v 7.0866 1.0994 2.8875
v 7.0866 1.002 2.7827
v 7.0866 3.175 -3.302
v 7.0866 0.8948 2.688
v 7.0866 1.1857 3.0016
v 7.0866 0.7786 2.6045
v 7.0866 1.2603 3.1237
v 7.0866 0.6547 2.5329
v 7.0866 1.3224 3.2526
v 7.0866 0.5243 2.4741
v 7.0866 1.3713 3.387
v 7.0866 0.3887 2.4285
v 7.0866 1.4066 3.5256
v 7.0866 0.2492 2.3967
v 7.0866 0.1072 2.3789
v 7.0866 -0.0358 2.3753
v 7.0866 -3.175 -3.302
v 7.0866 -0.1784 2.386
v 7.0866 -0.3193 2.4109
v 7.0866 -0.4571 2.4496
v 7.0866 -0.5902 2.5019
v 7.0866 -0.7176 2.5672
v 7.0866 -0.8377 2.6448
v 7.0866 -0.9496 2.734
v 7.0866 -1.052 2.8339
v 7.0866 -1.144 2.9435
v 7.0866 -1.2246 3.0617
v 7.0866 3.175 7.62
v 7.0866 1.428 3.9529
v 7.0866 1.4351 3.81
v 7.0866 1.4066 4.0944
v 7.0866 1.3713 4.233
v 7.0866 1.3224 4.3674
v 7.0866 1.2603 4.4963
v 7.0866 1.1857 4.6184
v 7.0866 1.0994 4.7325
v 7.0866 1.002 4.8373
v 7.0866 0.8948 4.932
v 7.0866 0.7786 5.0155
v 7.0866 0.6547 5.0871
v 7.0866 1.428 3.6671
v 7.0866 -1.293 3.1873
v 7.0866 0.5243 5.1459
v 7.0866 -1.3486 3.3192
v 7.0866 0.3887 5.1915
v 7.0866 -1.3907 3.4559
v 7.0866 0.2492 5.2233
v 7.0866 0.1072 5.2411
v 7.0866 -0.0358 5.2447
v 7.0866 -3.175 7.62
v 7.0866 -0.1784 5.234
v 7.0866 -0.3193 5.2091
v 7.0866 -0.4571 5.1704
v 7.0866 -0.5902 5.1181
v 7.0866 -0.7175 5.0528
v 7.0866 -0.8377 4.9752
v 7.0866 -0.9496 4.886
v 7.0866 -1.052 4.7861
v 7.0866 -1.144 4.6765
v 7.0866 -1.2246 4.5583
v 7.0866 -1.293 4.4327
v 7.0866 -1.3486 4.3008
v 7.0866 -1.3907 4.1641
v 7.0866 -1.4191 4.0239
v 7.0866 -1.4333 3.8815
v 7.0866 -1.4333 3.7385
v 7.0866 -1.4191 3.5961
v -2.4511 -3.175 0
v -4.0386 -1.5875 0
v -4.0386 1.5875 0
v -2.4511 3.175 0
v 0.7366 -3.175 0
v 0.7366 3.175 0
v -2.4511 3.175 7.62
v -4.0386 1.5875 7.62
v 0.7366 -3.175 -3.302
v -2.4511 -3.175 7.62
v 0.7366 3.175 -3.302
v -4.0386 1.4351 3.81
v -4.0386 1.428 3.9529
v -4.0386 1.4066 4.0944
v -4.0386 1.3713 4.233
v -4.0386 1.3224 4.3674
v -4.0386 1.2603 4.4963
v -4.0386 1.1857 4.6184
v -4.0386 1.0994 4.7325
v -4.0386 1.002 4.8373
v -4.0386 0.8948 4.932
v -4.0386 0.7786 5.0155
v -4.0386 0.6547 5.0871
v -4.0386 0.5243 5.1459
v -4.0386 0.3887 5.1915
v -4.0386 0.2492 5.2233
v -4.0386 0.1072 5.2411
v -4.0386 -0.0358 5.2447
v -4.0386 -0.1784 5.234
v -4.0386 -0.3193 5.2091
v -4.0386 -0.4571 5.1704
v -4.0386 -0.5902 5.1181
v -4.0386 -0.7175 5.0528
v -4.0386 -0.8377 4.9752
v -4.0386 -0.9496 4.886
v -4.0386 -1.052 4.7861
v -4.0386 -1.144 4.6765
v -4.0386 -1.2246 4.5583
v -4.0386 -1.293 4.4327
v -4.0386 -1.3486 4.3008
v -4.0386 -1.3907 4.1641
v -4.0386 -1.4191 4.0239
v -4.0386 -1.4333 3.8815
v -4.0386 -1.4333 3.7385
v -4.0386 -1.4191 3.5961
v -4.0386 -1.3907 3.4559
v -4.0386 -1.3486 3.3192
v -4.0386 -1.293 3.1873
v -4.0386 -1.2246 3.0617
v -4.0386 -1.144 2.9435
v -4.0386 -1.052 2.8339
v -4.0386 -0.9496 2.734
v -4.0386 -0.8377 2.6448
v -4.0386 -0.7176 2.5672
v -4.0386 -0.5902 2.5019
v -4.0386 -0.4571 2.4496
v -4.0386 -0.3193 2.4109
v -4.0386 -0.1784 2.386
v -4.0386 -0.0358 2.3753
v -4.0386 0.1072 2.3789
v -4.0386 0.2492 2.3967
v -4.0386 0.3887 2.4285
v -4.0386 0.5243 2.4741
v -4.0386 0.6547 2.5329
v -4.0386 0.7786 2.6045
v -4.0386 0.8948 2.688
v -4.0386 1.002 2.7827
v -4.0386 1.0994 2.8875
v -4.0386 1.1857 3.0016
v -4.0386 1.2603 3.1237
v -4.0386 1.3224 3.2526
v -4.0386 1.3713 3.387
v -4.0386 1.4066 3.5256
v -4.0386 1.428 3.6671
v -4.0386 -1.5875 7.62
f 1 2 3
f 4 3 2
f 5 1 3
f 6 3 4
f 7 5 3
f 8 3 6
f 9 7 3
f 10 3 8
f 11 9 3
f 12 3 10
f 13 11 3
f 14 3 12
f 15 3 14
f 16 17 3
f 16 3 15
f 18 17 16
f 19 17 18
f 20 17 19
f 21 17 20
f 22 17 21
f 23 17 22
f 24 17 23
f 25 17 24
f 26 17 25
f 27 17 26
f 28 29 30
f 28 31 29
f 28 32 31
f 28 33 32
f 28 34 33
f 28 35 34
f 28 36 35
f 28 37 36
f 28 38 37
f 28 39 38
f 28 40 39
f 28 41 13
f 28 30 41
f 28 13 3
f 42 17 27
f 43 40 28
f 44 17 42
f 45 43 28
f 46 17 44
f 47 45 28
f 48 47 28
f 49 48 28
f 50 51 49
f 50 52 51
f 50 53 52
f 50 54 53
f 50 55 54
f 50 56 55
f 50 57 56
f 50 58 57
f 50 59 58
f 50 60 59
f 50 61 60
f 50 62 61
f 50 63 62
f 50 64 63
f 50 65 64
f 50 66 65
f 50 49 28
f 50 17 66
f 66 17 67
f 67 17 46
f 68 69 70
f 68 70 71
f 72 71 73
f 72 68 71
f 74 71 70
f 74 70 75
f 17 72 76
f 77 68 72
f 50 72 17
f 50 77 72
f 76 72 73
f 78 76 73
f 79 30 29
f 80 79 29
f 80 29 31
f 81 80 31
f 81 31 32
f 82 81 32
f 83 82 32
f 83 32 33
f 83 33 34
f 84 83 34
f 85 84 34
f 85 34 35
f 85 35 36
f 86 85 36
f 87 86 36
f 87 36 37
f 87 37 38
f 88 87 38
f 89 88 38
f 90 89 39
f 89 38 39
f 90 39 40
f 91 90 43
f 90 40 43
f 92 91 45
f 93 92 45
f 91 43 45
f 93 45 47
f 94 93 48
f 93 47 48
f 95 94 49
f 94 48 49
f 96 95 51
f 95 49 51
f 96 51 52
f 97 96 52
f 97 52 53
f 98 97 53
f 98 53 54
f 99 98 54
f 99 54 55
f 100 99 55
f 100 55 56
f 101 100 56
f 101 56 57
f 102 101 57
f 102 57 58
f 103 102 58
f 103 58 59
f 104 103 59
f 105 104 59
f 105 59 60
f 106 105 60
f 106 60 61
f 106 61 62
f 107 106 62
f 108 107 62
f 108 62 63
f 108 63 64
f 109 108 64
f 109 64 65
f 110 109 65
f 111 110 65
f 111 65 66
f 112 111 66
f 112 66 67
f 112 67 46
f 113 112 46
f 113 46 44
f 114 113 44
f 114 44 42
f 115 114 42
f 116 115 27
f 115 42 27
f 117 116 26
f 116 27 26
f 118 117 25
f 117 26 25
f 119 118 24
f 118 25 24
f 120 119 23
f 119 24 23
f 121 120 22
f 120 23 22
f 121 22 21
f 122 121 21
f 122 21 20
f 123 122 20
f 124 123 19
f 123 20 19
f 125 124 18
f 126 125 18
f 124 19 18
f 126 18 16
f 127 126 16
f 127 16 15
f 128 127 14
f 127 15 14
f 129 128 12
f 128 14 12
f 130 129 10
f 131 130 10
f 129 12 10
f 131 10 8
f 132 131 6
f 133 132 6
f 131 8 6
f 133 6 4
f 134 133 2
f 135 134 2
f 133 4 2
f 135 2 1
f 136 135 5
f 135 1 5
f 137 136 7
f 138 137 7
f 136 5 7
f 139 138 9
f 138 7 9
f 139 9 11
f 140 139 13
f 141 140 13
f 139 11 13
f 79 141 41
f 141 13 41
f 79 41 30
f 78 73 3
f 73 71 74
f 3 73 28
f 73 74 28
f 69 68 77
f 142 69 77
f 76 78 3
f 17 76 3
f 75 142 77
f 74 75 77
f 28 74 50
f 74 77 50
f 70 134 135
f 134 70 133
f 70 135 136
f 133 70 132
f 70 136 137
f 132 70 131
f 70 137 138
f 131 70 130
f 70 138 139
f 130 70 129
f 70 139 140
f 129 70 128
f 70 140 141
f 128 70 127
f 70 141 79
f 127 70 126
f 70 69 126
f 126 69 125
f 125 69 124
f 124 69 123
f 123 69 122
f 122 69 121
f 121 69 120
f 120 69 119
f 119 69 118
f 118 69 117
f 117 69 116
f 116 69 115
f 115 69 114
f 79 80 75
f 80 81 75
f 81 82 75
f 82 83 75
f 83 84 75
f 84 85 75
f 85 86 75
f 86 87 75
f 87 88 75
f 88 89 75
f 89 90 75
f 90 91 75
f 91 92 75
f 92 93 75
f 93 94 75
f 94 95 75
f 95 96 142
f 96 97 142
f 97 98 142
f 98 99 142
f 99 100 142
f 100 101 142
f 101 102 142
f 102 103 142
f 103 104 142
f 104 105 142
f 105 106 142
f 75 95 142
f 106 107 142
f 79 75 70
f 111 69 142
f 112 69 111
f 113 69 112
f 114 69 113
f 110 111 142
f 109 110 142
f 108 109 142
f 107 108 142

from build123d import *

# Parameters (mm, degrees)
F0_W     = 6.35
F0_H     = 6.35
F1_DEPTH = 3.302
F2_W     = 11.1252
F2_H     = 7.62
F3_DEPTH = 3.175
F4_R     = 1.4351
F5_DEPTH = 11.1262
F6_SIZE  = 1.5875


with BuildPart() as f1:
    # F0 (on Top) → F1 (new body)
    with BuildSketch(Plane.XY):
        with Locations((3.9116, 0)):
            Rectangle(F0_W, F0_H)
    extrude(amount=-F1_DEPTH)

    # F2 (on Front) → F3 (join, symmetric)
    with BuildSketch(Plane.XZ):
        with Locations((1.524, 3.81)):
            Rectangle(F2_W, F2_H)
    extrude(amount=F3_DEPTH, both=True)

    # F4 (on face) → F5 (cut, through all)
    with BuildSketch(Plane.YZ.offset(7.0866)):
        with Locations((0, 3.81)):
            Circle(F4_R)
    extrude(amount=-F5_DEPTH, mode=Mode.SUBTRACT)

    # F6
    f6_edges = [f1.edges().sort_by_distance(p)[0] for p in [
        (-4.0386, -3.175, 3.81),
        (-4.0386, 3.175, 3.81),
    ]]
    chamfer(f6_edges, length=F6_SIZE)


solid = f1.part
